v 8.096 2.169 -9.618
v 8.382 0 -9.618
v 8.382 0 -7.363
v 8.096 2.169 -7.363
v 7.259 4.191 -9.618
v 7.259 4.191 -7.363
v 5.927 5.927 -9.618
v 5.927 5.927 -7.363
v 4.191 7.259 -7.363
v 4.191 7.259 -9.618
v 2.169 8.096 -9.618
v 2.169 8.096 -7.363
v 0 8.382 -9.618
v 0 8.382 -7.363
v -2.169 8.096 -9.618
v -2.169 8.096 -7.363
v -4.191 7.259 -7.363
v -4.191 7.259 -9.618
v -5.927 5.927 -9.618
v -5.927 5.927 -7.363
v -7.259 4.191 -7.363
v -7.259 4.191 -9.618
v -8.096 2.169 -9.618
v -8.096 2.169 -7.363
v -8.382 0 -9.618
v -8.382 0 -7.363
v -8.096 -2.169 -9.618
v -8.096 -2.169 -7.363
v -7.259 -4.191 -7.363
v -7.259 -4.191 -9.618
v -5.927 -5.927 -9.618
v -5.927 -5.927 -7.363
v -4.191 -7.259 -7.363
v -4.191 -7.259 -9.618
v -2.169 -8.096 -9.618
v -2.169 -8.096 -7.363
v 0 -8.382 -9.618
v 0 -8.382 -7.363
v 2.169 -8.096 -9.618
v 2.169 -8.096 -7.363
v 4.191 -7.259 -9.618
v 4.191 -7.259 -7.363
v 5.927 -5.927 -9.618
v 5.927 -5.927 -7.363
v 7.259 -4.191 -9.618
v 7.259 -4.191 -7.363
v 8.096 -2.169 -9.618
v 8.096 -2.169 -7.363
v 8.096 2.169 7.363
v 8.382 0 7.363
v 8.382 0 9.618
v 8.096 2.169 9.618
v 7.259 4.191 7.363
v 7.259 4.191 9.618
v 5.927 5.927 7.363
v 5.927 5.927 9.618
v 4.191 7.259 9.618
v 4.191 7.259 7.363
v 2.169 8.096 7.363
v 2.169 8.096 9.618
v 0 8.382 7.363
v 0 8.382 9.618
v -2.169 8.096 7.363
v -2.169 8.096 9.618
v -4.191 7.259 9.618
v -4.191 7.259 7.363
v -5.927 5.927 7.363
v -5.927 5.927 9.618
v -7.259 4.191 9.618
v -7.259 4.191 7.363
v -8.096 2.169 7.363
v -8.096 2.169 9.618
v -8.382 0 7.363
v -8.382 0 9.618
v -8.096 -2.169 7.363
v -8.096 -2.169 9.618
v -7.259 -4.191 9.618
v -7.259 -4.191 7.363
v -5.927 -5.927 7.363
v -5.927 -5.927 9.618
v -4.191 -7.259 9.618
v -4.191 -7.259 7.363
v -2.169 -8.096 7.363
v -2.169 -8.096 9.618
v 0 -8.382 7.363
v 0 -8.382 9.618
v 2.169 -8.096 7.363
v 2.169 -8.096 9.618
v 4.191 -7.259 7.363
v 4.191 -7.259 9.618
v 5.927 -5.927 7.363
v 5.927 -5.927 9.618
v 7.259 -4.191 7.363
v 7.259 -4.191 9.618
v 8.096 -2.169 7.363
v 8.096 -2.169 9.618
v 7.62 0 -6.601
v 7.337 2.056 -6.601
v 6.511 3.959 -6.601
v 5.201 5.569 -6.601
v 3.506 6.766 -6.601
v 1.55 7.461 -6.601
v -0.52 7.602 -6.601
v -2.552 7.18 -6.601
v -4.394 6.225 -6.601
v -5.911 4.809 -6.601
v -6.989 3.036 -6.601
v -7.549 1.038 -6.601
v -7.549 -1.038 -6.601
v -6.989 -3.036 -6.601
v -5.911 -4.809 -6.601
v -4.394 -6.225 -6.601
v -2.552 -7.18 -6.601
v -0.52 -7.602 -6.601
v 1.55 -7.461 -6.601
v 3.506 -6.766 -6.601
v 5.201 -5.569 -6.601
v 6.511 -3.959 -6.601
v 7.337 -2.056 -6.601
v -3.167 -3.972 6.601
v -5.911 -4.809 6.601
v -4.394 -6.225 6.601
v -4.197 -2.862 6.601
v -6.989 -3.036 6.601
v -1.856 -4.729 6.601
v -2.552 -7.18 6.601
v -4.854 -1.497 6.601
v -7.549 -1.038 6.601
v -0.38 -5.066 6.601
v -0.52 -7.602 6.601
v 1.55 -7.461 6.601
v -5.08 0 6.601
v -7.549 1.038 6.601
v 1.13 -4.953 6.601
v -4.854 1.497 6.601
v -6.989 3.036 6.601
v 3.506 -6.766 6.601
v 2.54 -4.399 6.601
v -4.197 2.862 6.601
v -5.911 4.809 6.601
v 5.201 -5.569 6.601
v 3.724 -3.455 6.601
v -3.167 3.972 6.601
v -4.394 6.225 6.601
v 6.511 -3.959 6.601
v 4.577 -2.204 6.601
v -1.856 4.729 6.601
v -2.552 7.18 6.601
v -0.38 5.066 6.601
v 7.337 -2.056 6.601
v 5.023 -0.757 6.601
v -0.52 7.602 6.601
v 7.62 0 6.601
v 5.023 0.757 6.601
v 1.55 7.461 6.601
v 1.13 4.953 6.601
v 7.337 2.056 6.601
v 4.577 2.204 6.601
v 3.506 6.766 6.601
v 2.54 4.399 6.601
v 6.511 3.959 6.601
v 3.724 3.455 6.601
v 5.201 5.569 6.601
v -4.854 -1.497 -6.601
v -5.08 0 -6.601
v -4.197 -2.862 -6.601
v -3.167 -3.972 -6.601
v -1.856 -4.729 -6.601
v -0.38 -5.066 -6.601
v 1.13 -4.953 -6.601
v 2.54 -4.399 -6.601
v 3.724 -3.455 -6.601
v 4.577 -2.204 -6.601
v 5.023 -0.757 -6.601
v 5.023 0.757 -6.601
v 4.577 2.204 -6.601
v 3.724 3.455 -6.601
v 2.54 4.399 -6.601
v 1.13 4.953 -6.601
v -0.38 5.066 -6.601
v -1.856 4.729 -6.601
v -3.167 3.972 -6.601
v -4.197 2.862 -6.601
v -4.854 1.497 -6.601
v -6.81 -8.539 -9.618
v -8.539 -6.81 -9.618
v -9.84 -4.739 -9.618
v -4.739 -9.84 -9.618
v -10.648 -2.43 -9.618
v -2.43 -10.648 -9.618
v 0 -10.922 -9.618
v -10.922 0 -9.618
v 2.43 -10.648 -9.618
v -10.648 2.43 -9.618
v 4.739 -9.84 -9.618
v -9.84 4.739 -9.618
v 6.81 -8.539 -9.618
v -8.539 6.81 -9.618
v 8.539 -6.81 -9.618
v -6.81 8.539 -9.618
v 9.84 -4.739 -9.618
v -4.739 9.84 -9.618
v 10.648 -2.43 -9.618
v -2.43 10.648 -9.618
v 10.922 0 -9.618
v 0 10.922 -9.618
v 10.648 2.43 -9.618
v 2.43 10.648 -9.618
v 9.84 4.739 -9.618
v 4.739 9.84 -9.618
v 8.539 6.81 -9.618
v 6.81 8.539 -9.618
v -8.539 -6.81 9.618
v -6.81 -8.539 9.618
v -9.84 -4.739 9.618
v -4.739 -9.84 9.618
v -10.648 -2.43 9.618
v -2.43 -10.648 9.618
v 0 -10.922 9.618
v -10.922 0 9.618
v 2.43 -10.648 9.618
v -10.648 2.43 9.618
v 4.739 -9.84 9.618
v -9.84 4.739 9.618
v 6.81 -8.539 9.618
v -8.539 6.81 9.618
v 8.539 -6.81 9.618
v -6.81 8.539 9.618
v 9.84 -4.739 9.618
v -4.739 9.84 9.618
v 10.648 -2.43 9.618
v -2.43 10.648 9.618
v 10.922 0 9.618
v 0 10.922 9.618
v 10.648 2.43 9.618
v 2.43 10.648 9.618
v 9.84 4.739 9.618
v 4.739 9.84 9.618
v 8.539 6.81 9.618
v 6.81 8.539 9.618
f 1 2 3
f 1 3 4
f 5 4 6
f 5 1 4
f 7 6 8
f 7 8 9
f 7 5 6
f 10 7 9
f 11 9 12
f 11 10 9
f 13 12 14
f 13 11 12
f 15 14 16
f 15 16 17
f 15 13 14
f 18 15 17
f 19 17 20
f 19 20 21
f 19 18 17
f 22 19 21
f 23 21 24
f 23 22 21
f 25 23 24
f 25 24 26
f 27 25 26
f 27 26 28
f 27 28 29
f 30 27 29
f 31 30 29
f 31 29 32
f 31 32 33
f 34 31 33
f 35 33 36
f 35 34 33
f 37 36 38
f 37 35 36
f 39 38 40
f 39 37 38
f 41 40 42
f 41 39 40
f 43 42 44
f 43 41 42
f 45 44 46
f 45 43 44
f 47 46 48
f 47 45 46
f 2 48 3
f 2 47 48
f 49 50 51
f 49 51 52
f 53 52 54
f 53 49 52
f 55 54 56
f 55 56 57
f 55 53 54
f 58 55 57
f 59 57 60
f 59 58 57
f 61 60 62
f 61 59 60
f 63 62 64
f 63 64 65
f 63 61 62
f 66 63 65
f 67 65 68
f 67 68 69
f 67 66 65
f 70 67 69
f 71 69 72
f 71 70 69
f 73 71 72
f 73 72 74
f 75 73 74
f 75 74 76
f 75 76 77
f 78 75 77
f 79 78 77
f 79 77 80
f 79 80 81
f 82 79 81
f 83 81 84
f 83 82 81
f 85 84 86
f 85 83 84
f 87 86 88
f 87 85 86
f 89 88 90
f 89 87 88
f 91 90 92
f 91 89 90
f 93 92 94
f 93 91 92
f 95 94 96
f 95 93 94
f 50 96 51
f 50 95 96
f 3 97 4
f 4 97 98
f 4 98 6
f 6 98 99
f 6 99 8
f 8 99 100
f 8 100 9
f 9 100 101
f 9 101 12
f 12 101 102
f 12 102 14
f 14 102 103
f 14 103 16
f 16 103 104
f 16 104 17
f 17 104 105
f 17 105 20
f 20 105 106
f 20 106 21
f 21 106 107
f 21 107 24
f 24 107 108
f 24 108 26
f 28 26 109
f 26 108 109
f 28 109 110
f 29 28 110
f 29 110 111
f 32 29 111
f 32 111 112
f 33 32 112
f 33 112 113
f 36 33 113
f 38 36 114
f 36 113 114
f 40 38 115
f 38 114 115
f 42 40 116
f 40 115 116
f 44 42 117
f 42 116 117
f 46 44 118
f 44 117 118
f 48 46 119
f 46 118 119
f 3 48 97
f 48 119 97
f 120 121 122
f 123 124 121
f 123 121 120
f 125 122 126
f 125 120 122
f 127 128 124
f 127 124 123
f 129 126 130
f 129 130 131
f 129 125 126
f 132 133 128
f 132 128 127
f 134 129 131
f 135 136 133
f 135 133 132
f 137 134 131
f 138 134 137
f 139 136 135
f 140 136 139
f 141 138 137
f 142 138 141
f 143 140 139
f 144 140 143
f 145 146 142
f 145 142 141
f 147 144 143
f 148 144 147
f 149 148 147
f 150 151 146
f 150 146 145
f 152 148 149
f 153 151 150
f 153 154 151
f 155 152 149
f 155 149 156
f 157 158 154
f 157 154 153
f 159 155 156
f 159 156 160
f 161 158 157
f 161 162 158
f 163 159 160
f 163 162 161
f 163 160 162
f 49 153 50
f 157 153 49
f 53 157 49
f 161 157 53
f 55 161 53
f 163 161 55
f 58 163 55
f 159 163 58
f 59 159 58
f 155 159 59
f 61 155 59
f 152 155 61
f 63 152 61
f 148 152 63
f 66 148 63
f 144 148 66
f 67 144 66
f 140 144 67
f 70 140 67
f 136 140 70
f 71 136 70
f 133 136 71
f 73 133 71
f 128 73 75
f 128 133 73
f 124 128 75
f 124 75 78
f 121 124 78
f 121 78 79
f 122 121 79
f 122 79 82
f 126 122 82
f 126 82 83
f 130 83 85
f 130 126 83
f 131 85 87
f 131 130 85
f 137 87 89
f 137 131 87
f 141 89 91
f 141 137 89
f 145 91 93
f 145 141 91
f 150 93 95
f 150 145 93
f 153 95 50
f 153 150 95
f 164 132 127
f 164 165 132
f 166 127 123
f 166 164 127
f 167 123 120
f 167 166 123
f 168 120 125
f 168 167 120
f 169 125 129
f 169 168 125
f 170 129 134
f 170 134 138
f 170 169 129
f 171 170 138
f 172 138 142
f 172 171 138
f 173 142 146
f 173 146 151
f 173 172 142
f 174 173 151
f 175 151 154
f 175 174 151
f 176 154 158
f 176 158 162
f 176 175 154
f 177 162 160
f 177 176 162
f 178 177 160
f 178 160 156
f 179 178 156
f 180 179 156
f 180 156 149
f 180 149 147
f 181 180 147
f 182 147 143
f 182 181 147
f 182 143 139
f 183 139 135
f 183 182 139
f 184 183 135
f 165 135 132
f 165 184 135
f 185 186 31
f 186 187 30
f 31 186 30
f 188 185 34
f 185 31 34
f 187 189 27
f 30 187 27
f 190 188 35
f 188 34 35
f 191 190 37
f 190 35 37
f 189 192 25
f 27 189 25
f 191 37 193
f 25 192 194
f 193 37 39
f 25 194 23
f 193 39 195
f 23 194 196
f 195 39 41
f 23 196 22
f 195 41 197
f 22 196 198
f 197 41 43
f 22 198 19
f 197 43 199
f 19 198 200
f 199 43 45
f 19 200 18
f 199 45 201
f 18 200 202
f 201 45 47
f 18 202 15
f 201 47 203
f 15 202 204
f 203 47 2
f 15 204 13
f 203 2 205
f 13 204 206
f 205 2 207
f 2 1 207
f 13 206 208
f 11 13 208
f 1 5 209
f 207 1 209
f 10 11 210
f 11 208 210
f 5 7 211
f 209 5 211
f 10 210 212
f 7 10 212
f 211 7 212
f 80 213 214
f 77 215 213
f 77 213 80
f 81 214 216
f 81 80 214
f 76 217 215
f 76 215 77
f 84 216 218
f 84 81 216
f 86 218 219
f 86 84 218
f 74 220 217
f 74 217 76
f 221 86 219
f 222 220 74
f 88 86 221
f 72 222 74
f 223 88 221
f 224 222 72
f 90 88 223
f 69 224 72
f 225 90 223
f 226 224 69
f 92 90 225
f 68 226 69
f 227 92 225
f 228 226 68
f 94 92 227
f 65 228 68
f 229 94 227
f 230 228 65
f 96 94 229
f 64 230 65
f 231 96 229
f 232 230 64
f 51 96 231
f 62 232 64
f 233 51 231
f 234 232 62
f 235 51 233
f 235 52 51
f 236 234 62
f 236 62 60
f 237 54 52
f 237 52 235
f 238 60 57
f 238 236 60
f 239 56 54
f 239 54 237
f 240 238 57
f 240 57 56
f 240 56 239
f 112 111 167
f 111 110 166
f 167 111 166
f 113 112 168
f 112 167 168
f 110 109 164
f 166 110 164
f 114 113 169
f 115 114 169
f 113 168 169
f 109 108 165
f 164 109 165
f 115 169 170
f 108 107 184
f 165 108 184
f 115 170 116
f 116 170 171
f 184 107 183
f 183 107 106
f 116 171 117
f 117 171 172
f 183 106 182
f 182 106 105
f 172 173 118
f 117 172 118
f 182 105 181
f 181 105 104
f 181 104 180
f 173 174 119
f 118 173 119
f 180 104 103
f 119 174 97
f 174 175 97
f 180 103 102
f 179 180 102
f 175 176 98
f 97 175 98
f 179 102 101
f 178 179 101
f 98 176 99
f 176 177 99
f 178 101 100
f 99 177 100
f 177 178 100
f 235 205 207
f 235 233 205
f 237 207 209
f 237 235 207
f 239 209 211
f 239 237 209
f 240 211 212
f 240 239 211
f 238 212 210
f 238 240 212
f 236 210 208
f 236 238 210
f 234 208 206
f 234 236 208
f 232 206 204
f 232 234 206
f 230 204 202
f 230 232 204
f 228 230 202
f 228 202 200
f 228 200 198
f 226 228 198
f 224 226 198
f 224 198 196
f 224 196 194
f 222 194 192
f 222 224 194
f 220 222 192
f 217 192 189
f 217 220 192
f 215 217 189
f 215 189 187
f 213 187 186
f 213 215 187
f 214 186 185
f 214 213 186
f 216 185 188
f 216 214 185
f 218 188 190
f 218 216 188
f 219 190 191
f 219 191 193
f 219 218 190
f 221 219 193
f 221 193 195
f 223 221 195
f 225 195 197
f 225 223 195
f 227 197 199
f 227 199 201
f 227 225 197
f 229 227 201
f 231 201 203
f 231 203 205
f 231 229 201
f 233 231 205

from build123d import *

# Parameters (mm, degrees)
SKETCH1_R           = 10.922
SKETCH1_R_2         = 8.382
BOSS_EXTRUDE1_DEPTH = 9.61771
SKETCH1_3_R         = 8.382
SKETCH1_3_R_2       = 5.08
BOSS_EXTRUDE2_DEPTH = 6.60146
CHAMFER1_SIZE       = 0.762


with BuildPart() as part:
    # Sketch1 → Boss-Extrude1 (new, symmetric)
    with BuildSketch(Plane.XY):
        Circle(SKETCH1_R)
        Circle(SKETCH1_R_2, mode=Mode.SUBTRACT)
    extrude(amount=BOSS_EXTRUDE1_DEPTH, both=True)

    # Sketch1<3> → Boss-Extrude2 (add, symmetric)
    with BuildSketch(Plane.XY):
        Circle(SKETCH1_3_R)
        Circle(SKETCH1_3_R_2, mode=Mode.SUBTRACT)
    extrude(amount=BOSS_EXTRUDE2_DEPTH, both=True)

    # Chamfer1
    chamfer1_edges = [part.edges().sort_by_distance(p)[0] for p in [
        (-8.382, 0, -6.60146),
        (-8.382, 0, 6.60146),
    ]]
    chamfer(chamfer1_edges, length=CHAMFER1_SIZE)


solid = part.part
